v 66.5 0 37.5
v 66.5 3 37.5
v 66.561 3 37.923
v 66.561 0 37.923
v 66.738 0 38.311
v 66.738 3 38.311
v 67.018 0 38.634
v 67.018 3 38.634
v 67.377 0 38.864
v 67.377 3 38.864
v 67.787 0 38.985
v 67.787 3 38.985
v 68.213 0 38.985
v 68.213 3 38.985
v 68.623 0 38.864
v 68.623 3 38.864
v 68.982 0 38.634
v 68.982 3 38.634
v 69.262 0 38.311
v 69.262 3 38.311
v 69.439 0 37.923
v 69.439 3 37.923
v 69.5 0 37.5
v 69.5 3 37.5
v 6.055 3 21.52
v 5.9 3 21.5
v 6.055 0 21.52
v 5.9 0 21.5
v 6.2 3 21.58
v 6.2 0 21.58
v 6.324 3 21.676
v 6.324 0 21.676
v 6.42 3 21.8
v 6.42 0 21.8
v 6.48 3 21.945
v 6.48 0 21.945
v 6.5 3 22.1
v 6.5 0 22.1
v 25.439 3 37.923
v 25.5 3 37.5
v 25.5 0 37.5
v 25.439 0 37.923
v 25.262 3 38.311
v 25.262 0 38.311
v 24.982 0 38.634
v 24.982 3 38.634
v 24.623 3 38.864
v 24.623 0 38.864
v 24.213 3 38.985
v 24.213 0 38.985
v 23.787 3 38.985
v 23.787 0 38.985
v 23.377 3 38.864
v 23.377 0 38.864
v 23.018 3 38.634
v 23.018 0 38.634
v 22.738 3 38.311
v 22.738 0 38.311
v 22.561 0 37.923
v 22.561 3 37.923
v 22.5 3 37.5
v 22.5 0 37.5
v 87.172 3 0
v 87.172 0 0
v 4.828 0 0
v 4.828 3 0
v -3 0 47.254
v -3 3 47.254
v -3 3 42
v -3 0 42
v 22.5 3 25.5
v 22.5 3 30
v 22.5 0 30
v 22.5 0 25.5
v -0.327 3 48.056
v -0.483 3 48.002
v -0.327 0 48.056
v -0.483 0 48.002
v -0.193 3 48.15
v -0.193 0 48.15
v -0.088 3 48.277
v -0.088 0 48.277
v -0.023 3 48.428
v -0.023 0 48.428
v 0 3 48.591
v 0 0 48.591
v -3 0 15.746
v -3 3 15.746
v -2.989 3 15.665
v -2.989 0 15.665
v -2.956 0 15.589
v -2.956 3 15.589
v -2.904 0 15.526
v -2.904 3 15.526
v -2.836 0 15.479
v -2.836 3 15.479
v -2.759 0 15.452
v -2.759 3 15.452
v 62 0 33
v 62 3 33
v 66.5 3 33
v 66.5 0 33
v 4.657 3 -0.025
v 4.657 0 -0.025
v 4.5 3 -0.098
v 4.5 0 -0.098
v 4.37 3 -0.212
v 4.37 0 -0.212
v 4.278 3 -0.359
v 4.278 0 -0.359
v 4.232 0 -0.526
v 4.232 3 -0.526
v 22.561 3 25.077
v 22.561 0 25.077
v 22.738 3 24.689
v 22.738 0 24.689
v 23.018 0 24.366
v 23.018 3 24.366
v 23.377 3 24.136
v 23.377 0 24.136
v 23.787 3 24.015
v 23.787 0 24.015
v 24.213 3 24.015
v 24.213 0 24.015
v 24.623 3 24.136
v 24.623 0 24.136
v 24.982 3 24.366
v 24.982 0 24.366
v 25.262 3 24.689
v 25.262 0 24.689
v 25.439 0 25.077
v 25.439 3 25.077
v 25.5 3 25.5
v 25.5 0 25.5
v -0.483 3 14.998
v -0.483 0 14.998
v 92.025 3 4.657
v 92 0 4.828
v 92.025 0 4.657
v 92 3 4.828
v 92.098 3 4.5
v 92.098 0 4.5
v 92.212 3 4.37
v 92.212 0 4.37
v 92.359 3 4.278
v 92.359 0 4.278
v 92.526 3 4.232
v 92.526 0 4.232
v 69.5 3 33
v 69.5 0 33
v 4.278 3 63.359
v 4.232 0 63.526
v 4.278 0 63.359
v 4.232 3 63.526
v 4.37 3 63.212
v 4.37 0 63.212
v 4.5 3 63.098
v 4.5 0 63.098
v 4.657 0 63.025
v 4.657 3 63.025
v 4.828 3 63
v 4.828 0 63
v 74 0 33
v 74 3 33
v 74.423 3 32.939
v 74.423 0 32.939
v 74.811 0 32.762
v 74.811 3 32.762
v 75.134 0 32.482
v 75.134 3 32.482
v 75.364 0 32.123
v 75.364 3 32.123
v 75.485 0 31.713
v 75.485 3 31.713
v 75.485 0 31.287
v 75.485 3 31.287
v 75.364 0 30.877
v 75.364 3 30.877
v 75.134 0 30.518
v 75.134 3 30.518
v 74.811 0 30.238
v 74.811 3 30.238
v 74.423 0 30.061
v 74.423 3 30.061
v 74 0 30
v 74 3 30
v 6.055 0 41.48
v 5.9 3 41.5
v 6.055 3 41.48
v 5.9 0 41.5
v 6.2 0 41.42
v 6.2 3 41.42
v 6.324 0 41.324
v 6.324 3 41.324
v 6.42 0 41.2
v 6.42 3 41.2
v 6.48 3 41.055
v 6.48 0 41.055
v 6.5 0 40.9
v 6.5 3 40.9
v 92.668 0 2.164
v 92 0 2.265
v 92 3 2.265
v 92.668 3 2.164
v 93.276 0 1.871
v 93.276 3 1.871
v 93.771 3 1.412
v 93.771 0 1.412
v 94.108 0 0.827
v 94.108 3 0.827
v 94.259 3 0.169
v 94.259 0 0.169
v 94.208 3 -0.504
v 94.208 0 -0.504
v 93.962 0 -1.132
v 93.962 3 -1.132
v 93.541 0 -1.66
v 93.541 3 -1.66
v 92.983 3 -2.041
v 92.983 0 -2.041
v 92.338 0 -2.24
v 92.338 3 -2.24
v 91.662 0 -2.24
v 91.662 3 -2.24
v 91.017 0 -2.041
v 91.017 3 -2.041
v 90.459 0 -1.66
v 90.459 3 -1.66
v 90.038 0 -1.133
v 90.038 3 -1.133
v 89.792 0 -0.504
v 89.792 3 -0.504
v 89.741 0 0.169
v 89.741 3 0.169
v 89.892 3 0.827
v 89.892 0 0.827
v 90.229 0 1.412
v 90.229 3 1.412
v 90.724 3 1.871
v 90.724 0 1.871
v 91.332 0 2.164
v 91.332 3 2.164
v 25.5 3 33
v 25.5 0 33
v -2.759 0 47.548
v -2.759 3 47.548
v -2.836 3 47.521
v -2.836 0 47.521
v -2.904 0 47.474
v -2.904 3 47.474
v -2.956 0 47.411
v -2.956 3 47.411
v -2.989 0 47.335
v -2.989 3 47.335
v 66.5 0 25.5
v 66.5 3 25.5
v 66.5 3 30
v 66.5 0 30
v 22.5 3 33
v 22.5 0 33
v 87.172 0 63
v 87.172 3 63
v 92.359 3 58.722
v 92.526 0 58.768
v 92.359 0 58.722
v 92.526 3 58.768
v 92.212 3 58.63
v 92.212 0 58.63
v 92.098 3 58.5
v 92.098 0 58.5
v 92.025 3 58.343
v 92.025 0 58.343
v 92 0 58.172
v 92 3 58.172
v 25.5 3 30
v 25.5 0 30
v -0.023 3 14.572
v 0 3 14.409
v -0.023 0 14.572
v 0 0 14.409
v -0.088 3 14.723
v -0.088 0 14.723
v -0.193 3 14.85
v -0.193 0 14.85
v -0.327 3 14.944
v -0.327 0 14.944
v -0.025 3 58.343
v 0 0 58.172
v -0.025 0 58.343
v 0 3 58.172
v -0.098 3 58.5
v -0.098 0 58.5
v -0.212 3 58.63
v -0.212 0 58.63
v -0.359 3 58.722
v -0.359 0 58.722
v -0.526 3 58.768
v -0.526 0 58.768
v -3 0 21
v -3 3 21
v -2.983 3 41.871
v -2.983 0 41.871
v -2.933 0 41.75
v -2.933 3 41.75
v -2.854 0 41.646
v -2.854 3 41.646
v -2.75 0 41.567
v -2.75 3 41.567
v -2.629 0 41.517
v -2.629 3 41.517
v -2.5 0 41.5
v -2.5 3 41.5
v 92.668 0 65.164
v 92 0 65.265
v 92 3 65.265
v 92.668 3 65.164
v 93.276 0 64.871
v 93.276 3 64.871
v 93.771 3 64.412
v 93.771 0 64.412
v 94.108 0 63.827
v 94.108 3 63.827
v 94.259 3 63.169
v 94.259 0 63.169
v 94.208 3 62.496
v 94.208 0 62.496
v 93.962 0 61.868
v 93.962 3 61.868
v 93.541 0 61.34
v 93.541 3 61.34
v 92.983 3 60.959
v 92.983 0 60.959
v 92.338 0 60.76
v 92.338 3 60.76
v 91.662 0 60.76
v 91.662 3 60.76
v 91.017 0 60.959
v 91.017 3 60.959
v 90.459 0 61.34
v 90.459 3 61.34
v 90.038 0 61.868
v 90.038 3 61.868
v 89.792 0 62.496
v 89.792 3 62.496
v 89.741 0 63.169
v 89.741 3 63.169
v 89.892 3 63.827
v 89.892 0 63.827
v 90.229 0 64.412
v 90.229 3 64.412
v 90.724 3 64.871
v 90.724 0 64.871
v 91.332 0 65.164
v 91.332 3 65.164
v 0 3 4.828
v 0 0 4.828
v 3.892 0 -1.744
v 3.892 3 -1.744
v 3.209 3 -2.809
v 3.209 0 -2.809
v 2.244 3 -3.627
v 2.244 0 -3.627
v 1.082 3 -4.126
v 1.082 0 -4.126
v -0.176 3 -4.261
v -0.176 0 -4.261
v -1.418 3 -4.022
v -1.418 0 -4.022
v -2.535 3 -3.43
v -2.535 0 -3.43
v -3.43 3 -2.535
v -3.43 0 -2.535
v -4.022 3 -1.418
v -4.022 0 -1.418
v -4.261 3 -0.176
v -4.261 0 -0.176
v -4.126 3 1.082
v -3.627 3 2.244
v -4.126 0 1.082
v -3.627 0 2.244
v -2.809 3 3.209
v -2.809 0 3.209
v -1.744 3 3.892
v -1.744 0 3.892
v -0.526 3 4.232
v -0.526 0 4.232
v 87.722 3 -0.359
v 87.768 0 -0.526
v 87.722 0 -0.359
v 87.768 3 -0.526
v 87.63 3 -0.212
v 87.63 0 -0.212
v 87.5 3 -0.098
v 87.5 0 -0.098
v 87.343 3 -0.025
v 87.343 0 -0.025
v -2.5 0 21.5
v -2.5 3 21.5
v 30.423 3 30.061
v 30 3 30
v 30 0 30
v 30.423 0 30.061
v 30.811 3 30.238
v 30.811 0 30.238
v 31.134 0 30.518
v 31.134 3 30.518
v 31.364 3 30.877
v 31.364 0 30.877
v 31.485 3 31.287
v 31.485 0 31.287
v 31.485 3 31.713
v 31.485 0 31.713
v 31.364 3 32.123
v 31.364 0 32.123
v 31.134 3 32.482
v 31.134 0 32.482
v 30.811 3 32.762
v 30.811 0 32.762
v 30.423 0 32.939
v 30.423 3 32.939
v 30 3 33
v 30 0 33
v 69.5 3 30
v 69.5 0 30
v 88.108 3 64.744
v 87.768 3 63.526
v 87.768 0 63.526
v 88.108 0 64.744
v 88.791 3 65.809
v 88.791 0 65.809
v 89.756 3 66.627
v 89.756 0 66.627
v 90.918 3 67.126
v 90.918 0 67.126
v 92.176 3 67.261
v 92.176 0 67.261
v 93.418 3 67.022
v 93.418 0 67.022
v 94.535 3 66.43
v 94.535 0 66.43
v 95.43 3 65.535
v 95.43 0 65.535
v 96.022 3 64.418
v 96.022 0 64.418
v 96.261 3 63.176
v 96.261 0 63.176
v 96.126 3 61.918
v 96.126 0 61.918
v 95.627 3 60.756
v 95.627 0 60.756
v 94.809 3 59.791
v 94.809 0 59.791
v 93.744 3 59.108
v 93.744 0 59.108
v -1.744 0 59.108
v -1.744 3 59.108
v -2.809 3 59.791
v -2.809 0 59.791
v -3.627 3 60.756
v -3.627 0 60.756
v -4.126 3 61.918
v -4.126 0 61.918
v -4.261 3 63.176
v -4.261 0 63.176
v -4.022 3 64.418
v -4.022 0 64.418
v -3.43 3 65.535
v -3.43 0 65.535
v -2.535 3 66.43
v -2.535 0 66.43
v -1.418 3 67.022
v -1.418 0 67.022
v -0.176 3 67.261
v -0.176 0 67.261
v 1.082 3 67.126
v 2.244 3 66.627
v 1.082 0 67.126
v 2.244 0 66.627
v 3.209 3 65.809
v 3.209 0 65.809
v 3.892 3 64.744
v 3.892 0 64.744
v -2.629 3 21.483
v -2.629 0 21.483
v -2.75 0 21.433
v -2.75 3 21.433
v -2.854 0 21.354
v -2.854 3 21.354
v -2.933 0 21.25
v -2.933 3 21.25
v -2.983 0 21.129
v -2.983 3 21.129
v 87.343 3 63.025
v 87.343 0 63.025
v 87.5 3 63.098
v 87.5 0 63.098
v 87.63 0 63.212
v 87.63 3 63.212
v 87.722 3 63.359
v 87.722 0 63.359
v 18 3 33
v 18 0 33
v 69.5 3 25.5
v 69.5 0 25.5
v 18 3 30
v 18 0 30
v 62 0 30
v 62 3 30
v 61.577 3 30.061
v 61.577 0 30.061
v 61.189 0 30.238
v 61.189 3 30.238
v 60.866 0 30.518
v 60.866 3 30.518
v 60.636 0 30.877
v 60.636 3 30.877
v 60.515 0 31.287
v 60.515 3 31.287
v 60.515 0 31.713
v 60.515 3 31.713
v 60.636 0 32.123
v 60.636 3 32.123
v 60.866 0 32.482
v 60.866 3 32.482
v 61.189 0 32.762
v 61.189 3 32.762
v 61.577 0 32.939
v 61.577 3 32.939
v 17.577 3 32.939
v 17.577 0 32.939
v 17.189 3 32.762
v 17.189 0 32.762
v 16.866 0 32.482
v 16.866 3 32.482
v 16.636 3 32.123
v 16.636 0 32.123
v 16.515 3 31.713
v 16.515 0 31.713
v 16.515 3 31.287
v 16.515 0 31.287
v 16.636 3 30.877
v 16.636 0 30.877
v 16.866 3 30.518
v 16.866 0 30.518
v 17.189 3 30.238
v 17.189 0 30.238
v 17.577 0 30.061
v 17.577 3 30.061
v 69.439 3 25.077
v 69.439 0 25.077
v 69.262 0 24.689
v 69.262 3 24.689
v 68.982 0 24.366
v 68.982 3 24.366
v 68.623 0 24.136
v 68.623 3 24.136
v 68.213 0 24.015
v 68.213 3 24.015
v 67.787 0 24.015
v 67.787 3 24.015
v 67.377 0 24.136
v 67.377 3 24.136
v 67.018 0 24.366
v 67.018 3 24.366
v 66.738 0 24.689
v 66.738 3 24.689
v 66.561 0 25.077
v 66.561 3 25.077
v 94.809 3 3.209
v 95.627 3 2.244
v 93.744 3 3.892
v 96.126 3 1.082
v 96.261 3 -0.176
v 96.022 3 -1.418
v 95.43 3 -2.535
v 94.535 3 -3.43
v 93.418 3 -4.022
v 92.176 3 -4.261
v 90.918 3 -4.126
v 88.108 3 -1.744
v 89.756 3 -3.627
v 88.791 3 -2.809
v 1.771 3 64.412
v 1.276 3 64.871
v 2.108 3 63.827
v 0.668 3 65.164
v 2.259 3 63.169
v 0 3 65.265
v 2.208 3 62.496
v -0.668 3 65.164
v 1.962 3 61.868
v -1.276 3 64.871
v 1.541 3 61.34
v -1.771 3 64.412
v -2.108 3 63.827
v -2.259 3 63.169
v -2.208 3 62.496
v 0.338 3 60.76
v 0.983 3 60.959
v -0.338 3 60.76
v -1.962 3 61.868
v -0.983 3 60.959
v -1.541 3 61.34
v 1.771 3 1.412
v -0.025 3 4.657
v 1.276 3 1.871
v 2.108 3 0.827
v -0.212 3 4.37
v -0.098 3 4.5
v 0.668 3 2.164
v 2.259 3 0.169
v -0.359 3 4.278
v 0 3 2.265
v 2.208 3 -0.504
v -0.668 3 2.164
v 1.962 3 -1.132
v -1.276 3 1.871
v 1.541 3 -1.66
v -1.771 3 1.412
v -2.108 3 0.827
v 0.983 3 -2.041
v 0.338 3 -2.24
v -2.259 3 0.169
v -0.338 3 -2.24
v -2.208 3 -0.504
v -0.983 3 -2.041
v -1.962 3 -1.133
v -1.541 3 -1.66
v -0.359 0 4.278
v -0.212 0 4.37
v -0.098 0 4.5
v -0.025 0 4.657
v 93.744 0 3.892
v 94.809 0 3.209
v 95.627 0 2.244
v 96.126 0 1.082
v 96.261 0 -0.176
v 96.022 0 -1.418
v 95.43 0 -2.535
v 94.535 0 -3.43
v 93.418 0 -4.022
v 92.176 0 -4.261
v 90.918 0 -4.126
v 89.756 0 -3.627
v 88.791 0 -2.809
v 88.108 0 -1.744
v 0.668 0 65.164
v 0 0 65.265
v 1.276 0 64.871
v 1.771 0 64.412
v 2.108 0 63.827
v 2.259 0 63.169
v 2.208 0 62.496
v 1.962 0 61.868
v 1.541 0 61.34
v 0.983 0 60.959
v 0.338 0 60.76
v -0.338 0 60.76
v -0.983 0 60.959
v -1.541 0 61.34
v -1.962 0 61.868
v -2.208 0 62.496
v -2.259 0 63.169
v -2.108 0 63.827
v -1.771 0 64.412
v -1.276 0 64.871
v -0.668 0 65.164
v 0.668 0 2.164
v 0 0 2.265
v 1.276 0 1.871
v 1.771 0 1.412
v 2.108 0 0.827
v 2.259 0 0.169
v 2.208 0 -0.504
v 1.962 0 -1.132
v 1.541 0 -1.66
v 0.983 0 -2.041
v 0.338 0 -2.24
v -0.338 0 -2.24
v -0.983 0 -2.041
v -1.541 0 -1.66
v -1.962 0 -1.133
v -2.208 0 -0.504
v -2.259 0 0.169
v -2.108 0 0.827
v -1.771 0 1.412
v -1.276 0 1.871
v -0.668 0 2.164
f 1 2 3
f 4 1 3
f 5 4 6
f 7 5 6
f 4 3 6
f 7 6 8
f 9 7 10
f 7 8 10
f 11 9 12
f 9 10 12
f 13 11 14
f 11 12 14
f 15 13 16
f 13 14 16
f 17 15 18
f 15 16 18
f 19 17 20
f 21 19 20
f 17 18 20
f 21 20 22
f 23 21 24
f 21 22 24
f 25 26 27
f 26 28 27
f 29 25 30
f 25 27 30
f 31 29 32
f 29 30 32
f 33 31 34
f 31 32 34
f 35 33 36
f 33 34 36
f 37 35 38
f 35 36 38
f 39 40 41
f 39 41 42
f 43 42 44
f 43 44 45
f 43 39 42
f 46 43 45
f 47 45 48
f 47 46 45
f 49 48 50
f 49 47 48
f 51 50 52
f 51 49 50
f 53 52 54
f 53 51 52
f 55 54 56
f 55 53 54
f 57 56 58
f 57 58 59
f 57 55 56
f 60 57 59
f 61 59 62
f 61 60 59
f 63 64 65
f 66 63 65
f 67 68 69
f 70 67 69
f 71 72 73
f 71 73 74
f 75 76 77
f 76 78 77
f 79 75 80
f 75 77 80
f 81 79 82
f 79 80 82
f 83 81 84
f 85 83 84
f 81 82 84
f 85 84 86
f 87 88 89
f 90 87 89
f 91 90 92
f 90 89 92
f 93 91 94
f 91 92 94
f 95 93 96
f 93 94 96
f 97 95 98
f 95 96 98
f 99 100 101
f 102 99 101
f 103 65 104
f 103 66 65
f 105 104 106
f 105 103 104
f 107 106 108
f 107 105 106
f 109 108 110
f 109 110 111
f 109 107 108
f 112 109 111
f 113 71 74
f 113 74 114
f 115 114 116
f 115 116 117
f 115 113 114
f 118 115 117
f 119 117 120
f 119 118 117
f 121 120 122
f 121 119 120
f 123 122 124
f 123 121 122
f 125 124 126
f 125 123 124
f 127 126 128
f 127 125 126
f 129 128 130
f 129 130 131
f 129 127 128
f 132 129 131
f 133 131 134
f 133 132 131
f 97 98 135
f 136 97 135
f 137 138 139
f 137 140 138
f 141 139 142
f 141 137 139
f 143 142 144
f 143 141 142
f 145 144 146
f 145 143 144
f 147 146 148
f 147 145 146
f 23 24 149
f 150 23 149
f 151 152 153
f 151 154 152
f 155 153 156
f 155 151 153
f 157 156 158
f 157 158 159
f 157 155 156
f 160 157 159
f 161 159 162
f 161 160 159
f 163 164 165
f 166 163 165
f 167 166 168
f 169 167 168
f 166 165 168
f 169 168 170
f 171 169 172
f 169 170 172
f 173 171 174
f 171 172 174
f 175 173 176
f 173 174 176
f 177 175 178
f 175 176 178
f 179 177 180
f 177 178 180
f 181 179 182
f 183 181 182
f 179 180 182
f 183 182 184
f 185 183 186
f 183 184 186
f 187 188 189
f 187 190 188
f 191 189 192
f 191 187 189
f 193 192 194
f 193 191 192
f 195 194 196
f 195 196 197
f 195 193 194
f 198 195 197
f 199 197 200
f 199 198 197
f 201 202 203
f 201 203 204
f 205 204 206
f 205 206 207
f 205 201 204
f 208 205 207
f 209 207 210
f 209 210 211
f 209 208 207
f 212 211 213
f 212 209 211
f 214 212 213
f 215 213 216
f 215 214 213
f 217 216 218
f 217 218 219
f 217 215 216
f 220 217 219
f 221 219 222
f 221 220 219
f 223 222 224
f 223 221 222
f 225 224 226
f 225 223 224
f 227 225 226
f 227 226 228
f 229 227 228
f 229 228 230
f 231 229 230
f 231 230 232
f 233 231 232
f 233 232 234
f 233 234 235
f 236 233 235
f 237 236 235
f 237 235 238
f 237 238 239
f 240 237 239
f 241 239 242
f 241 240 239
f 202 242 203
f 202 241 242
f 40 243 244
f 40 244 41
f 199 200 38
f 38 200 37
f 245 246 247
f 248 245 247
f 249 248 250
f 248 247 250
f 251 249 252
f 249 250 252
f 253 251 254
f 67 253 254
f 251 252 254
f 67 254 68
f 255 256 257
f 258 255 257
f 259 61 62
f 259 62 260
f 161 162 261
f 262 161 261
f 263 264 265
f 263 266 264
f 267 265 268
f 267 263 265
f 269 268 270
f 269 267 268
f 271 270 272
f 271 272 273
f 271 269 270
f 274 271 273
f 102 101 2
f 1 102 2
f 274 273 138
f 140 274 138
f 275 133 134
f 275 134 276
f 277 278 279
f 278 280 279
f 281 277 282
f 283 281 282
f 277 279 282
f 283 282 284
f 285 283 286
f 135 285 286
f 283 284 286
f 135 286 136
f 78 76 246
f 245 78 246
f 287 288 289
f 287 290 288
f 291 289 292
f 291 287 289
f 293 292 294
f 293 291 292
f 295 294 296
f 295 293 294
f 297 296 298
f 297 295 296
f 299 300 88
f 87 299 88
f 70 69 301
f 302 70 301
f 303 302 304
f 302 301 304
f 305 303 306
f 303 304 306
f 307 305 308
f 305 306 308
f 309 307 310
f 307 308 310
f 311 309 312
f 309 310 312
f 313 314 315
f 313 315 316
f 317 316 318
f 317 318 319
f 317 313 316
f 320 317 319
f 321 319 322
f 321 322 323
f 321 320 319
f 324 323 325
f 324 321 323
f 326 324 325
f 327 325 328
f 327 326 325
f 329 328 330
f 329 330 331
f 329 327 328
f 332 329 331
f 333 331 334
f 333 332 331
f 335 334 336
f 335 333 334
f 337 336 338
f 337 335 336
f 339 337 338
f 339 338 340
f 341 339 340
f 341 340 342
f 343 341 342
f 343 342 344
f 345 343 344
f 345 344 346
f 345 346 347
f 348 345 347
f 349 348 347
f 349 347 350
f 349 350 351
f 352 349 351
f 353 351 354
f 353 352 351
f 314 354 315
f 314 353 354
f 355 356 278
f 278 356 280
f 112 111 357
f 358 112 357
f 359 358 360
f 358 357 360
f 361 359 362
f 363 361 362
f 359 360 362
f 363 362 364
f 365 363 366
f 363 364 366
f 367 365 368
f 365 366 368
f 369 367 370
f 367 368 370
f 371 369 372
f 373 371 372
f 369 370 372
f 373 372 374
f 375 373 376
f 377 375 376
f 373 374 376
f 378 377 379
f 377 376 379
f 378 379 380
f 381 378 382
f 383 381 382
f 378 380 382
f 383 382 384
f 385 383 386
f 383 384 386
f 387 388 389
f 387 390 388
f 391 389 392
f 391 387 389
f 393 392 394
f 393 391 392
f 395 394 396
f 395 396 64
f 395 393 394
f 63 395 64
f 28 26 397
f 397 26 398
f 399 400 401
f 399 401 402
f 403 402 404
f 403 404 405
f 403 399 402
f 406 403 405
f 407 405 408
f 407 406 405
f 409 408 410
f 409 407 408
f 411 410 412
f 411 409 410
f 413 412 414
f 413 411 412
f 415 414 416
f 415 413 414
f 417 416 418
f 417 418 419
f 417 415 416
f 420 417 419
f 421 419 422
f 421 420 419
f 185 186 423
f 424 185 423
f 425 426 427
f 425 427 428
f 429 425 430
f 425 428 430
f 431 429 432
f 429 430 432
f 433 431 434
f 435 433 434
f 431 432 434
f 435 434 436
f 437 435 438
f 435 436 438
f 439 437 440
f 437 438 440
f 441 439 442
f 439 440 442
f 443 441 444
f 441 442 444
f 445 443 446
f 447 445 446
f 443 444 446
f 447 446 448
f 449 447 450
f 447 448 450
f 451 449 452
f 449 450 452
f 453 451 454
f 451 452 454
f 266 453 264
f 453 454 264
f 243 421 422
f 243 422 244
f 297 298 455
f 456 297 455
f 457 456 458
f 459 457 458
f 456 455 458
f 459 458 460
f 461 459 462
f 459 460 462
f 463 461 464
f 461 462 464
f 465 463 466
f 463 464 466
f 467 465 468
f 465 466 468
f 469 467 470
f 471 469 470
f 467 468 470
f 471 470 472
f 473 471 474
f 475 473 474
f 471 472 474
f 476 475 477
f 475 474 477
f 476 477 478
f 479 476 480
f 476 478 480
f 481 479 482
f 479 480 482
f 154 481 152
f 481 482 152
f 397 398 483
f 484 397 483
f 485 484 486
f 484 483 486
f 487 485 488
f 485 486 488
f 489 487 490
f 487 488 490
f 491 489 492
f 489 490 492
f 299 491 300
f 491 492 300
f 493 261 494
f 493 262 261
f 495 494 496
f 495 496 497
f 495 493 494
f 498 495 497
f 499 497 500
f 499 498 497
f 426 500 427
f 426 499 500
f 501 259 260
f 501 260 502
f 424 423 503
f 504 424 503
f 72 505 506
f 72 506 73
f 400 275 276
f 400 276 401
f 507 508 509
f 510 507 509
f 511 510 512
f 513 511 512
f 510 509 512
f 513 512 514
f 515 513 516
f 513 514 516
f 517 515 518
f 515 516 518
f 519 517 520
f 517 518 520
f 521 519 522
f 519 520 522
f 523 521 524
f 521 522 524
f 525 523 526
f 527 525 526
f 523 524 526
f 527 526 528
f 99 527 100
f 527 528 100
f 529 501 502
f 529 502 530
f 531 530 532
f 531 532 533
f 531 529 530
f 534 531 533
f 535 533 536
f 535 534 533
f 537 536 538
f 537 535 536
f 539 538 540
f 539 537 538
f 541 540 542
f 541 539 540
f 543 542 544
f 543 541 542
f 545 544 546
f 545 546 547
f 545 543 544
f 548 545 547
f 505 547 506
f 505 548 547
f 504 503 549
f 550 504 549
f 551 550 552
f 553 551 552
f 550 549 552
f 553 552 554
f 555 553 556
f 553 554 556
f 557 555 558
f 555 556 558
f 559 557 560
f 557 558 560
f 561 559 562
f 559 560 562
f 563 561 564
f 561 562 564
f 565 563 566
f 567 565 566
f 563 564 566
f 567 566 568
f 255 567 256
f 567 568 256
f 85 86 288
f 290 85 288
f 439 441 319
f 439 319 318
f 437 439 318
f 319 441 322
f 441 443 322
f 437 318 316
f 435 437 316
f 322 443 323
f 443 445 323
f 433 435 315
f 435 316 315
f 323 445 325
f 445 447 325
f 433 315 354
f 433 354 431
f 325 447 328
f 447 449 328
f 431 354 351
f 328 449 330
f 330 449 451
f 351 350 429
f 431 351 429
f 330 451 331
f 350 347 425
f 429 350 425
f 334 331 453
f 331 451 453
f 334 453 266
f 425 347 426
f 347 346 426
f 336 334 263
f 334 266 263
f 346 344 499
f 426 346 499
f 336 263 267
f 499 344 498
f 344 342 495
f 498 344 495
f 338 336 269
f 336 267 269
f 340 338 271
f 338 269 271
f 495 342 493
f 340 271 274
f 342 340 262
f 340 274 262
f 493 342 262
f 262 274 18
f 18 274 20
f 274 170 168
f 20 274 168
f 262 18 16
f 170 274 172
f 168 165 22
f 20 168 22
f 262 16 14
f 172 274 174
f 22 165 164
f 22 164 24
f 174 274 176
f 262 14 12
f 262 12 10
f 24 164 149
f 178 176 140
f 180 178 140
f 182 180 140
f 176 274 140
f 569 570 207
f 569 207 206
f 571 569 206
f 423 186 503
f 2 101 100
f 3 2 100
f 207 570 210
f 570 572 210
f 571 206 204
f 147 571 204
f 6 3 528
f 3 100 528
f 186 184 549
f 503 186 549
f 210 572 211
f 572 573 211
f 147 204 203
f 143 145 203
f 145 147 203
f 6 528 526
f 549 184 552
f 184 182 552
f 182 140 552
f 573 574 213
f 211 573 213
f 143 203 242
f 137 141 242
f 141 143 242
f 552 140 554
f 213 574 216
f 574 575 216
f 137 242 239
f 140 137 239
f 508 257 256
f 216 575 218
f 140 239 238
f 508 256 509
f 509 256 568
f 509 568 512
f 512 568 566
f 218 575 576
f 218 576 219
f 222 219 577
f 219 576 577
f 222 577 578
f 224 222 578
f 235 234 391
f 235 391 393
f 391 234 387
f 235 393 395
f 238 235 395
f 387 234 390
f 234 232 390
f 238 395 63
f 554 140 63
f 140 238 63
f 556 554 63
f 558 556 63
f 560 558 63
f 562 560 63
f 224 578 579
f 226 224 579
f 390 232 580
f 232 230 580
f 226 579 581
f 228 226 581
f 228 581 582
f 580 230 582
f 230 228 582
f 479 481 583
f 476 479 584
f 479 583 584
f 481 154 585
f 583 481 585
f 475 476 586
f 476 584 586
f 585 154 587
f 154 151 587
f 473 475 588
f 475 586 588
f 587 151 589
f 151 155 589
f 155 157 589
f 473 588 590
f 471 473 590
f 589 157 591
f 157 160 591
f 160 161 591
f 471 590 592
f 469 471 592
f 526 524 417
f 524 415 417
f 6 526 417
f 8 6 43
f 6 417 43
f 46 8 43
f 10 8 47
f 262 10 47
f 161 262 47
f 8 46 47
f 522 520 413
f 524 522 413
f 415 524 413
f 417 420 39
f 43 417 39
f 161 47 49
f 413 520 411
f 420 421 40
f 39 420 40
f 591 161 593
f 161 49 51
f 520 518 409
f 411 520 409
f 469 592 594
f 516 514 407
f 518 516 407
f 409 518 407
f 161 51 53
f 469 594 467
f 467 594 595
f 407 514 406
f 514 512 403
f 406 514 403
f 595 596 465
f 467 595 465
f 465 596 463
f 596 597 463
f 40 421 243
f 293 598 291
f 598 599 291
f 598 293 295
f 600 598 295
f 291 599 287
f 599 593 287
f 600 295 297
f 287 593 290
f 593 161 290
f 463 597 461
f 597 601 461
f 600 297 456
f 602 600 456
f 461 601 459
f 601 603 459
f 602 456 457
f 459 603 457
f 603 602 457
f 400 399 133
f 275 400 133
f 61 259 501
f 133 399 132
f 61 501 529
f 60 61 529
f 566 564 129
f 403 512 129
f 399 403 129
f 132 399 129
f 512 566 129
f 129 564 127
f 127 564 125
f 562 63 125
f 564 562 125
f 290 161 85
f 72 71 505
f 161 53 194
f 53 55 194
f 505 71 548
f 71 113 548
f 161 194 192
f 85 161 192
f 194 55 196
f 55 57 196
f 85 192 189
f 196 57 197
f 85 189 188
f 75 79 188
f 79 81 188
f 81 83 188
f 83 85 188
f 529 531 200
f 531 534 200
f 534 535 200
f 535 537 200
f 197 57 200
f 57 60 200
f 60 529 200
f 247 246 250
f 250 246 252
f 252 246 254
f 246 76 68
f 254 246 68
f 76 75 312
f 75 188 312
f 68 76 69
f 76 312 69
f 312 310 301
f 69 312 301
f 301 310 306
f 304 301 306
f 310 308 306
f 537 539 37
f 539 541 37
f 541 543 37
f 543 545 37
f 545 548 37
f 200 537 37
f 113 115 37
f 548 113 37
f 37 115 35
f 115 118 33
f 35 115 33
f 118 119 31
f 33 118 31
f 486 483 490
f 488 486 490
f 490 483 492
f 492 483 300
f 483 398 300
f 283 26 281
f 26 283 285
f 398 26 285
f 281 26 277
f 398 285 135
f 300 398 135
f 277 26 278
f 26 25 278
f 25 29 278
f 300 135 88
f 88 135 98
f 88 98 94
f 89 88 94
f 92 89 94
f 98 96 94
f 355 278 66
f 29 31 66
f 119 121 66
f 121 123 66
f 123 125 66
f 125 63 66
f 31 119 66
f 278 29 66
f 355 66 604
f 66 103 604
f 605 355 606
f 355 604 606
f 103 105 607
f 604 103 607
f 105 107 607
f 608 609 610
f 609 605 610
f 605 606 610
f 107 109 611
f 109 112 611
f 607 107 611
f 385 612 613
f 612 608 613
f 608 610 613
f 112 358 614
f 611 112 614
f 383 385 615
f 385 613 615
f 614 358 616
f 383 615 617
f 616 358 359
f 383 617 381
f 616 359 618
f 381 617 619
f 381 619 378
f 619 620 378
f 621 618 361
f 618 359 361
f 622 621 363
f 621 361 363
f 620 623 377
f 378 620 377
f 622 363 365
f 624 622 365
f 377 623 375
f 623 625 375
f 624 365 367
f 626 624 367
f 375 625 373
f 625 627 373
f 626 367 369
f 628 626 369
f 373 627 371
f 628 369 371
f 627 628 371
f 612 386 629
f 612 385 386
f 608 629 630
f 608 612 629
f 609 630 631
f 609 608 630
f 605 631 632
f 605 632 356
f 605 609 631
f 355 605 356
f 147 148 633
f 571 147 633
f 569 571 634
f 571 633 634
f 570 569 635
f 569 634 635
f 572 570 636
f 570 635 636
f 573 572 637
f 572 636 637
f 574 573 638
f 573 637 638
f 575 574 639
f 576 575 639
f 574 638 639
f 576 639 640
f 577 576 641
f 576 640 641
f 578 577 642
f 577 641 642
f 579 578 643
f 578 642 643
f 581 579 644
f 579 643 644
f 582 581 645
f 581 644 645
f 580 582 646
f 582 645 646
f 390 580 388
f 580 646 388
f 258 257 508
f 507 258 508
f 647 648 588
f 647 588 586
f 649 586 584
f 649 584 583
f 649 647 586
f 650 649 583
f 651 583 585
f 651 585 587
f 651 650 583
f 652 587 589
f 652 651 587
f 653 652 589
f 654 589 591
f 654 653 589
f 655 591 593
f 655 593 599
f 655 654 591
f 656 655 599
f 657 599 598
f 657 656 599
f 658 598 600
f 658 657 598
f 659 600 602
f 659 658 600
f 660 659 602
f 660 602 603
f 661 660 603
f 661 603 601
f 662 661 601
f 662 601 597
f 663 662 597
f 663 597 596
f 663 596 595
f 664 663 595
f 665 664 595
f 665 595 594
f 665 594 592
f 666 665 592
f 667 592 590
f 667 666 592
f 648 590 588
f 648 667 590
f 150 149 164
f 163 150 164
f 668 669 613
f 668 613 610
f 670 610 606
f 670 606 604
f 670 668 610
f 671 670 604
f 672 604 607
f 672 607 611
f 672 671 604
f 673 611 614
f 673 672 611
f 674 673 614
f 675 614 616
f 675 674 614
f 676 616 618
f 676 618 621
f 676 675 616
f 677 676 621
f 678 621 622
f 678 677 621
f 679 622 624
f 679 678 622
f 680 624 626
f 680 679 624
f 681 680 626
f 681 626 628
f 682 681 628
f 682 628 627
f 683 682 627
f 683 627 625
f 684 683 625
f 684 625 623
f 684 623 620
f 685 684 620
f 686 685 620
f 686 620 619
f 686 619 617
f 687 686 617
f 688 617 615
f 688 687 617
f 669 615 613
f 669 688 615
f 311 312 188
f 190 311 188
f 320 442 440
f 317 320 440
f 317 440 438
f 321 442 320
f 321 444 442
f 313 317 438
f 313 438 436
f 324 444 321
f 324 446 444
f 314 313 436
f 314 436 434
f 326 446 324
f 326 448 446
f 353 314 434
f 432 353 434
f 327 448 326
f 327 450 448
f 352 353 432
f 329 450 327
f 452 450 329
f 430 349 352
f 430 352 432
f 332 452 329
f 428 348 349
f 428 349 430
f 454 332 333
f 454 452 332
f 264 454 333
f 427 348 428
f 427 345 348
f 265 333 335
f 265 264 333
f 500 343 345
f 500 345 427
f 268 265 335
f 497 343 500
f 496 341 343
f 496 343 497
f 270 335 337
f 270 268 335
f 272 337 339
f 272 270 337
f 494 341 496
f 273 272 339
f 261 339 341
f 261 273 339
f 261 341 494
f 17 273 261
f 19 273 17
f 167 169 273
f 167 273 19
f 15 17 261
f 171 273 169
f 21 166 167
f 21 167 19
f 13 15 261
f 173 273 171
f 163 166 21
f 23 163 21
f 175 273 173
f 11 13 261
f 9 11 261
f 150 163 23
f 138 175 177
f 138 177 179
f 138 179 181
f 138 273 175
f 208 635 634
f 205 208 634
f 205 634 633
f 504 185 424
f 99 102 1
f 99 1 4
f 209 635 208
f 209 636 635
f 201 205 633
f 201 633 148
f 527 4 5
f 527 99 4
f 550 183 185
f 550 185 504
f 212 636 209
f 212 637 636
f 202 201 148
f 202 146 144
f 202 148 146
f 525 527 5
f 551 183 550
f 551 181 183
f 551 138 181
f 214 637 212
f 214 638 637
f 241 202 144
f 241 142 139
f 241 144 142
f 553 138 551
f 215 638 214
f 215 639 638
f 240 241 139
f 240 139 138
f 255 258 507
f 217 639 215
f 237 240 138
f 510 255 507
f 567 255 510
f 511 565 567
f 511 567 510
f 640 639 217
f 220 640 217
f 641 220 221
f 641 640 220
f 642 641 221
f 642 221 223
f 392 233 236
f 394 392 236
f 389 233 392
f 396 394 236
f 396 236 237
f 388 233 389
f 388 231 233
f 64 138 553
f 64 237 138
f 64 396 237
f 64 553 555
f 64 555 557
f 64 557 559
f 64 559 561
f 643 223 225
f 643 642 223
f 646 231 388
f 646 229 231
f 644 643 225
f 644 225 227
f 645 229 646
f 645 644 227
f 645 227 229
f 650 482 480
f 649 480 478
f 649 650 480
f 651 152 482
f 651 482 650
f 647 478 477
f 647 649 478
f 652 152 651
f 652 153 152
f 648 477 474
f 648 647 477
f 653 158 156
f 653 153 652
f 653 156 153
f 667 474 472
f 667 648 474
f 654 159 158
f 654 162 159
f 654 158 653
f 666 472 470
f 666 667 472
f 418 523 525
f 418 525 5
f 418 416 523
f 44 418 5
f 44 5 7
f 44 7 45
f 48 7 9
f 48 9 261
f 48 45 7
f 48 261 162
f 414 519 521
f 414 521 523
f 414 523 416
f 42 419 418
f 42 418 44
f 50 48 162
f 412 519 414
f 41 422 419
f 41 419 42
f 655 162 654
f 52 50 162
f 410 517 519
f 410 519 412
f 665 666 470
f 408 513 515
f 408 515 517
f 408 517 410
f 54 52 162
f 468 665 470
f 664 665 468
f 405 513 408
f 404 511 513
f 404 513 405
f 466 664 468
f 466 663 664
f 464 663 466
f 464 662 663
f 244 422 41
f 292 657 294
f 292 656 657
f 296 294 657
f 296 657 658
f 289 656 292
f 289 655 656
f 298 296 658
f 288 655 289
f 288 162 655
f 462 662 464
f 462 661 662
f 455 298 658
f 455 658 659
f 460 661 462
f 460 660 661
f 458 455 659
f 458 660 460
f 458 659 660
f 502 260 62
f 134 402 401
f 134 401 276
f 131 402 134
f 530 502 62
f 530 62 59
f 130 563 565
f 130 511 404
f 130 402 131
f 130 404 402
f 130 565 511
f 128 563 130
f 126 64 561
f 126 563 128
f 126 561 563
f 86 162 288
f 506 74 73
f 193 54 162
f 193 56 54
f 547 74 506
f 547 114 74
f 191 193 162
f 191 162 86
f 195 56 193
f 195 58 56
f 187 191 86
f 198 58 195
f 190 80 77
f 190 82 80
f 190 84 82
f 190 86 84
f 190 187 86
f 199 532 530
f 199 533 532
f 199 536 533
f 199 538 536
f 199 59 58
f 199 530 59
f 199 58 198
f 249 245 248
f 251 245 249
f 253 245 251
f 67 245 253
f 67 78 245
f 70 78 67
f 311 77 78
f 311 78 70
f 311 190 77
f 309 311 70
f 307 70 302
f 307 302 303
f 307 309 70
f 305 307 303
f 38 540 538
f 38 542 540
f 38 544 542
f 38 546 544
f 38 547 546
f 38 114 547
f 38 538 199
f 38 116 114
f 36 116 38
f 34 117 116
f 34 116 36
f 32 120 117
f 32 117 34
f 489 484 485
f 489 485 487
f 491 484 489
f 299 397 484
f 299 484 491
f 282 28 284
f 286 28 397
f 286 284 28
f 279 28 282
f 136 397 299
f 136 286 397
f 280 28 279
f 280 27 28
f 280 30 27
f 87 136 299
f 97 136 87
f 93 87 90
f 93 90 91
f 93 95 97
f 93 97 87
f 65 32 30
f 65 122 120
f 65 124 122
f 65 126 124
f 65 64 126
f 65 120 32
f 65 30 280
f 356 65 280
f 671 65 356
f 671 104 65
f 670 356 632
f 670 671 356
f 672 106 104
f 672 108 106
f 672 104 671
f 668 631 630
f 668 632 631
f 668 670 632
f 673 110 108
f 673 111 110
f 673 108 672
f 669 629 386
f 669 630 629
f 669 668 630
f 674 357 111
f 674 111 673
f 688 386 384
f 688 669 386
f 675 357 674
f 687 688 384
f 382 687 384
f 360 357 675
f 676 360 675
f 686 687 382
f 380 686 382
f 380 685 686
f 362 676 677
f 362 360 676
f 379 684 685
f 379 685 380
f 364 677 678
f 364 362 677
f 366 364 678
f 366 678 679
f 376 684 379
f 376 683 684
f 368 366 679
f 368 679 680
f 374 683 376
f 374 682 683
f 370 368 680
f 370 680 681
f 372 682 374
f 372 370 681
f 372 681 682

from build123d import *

# Parameters (mm, degrees)
SKETCH1_R           = 2.265
BOSS_EXTRUDE1_DEPTH = 3
CUT_EXTRUDE3_DEPTH  = 3
SKETCH8_W           = 6.5
SKETCH8_H           = 20
CUT_EXTRUDE4_DEPTH  = 3
BOSS_EXTRUDE4_DEPTH = 3
FILLET1_R           = 0.6


with BuildPart() as part:
    # Sketch1 → Boss-Extrude1 (new body)
    with BuildSketch(Plane(origin=(0, 0, 0), x_dir=(1, 0, 0), z_dir=(0, 1, 0))):
        with BuildLine():
            Line((0, -4.265), (0, -58.735))
            ThreePointArc((0, -58.735), (-3.015810422, -66.015810422), (4.265, -63))
            Line((4.265, -63), (87.735, -63))
            ThreePointArc((87.735, -63), (95.015810422, -66.015810422), (92, -58.735))
            Line((92, -58.735), (92, -4.265))
            ThreePointArc((92, -4.265), (95.015810422, 3.015810422), (87.735, 0))
            Line((87.735, 0), (4.265, 0))
            ThreePointArc((4.265, 0), (-3.015810422, 3.015810422), (0, -4.265))
        make_face()
        with Locations(Location((0, 0, 0), (0, 0, 270))):
            Circle(SKETCH1_R, mode=Mode.SUBTRACT)
        with Locations(Location((92, 0, 0), (0, 0, 270))):
            Circle(SKETCH1_R, mode=Mode.SUBTRACT)
        with Locations(Location((92, -63, 0), (0, 0, 270))):
            Circle(SKETCH1_R, mode=Mode.SUBTRACT)
        with Locations(Location((0, -63, 0), (0, 0, 270))):
            Circle(SKETCH1_R, mode=Mode.SUBTRACT)
    extrude(amount=BOSS_EXTRUDE1_DEPTH)

    # Sketch6 → Cut-Extrude3 (cut)
    with BuildSketch(Plane(origin=(0, 3, 0), x_dir=(1, 0, 0), z_dir=(0, 1, 0))):
        with BuildLine():
            Line((18, -30), (22.5, -30))
            Line((22.5, -30), (22.5, -25.5))
            ThreePointArc((22.5, -25.5), (24, -24), (25.5, -25.5))
            Line((25.5, -25.5), (25.5, -30))
            Line((25.5, -30), (30, -30))
            ThreePointArc((30, -30), (31.5, -31.5), (30, -33))
            Line((30, -33), (25.5, -33))
            Line((25.5, -33), (25.5, -37.5))
            ThreePointArc((25.5, -37.5), (24, -39), (22.5, -37.5))
            Line((22.5, -37.5), (22.5, -33))
            Line((22.5, -33), (18, -33))
            ThreePointArc((18, -33), (16.5, -31.5), (18, -30))
        make_face()
        with BuildLine():
            Line((74, -30), (69.5, -30))
            Line((69.5, -30), (69.5, -25.5))
            ThreePointArc((69.5, -25.5), (68, -24), (66.5, -25.5))
            Line((66.5, -25.5), (66.5, -30))
            Line((66.5, -30), (62, -30))
            ThreePointArc((62, -30), (60.5, -31.5), (62, -33))
            Line((62, -33), (66.5, -33))
            Line((66.5, -33), (66.5, -37.5))
            ThreePointArc((66.5, -37.5), (68, -39), (69.5, -37.5))
            Line((69.5, -37.5), (69.5, -33))
            Line((69.5, -33), (74, -33))
            ThreePointArc((74, -33), (75.5, -31.5), (74, -30))
        make_face()
    extrude(amount=-CUT_EXTRUDE3_DEPTH, mode=Mode.SUBTRACT)

    # Sketch8 → Cut-Extrude4 (cut)
    with BuildSketch(Plane(origin=(0, 3, 0), x_dir=(1, 0, 0), z_dir=(0, 1, 0))):
        with Locations((3.25, -31.5)):
            Rectangle(SKETCH8_W, SKETCH8_H)
    extrude(amount=-CUT_EXTRUDE4_DEPTH, mode=Mode.SUBTRACT)

    # Sketch9 → Boss-Extrude4 (add)
    with BuildSketch(Plane(origin=(0, 3, 0), x_dir=(1, 0, 0), z_dir=(0, 1, 0))):
        with BuildLine():
            Line((0, -21.5), (-2.5, -21.5))
            ThreePointArc((-2.5, -21.5), (-2.853553391, -21.353553391), (-3, -21))
            Line((-3, -21), (-3, -15.746058789))
            ThreePointArc((-3, -15.746058789), (-2.931958048, -15.555807734), (-2.758696908, -15.451857033))
            Line((-2.758696908, -15.451857033), (0, -14.901462701))
            Line((0, -14.901462701), (0, -21.5))
        make_face()
        with BuildLine():
            Line((0, -41.5), (0, -48.098537299))
            Line((0, -48.098537299), (-2.758696908, -47.548142967))
            ThreePointArc((-2.758696908, -47.548142967), (-2.931958048, -47.444192266), (-3, -47.253941211))
            Line((-3, -47.253941211), (-3, -42))
            ThreePointArc((-3, -42), (-2.853553391, -41.646446609), (-2.5, -41.5))
            Line((-2.5, -41.5), (0, -41.5))
        make_face()
    extrude(amount=-BOSS_EXTRUDE4_DEPTH)

    # Fillet1
    fillet1_edges = [part.edges().sort_by_distance(p)[0] for p in [
        (6.5, 1.5, 21.5),
        (6.5, 1.5, 41.5),
        (0, 1.5, 14.901462701),
        (4.265, 1.5, 0),
        (87.735, 1.5, 0),
        (92, 1.5, 4.265),
        (92, 1.5, 58.735),
        (87.735, 1.5, 63),
        (4.265, 1.5, 63),
        (0, 1.5, 58.735),
        (0, 1.5, 4.265),
        (0, 1.5, 48.098537299),
    ]]
    fillet(fillet1_edges, radius=FILLET1_R)


solid = part.part
